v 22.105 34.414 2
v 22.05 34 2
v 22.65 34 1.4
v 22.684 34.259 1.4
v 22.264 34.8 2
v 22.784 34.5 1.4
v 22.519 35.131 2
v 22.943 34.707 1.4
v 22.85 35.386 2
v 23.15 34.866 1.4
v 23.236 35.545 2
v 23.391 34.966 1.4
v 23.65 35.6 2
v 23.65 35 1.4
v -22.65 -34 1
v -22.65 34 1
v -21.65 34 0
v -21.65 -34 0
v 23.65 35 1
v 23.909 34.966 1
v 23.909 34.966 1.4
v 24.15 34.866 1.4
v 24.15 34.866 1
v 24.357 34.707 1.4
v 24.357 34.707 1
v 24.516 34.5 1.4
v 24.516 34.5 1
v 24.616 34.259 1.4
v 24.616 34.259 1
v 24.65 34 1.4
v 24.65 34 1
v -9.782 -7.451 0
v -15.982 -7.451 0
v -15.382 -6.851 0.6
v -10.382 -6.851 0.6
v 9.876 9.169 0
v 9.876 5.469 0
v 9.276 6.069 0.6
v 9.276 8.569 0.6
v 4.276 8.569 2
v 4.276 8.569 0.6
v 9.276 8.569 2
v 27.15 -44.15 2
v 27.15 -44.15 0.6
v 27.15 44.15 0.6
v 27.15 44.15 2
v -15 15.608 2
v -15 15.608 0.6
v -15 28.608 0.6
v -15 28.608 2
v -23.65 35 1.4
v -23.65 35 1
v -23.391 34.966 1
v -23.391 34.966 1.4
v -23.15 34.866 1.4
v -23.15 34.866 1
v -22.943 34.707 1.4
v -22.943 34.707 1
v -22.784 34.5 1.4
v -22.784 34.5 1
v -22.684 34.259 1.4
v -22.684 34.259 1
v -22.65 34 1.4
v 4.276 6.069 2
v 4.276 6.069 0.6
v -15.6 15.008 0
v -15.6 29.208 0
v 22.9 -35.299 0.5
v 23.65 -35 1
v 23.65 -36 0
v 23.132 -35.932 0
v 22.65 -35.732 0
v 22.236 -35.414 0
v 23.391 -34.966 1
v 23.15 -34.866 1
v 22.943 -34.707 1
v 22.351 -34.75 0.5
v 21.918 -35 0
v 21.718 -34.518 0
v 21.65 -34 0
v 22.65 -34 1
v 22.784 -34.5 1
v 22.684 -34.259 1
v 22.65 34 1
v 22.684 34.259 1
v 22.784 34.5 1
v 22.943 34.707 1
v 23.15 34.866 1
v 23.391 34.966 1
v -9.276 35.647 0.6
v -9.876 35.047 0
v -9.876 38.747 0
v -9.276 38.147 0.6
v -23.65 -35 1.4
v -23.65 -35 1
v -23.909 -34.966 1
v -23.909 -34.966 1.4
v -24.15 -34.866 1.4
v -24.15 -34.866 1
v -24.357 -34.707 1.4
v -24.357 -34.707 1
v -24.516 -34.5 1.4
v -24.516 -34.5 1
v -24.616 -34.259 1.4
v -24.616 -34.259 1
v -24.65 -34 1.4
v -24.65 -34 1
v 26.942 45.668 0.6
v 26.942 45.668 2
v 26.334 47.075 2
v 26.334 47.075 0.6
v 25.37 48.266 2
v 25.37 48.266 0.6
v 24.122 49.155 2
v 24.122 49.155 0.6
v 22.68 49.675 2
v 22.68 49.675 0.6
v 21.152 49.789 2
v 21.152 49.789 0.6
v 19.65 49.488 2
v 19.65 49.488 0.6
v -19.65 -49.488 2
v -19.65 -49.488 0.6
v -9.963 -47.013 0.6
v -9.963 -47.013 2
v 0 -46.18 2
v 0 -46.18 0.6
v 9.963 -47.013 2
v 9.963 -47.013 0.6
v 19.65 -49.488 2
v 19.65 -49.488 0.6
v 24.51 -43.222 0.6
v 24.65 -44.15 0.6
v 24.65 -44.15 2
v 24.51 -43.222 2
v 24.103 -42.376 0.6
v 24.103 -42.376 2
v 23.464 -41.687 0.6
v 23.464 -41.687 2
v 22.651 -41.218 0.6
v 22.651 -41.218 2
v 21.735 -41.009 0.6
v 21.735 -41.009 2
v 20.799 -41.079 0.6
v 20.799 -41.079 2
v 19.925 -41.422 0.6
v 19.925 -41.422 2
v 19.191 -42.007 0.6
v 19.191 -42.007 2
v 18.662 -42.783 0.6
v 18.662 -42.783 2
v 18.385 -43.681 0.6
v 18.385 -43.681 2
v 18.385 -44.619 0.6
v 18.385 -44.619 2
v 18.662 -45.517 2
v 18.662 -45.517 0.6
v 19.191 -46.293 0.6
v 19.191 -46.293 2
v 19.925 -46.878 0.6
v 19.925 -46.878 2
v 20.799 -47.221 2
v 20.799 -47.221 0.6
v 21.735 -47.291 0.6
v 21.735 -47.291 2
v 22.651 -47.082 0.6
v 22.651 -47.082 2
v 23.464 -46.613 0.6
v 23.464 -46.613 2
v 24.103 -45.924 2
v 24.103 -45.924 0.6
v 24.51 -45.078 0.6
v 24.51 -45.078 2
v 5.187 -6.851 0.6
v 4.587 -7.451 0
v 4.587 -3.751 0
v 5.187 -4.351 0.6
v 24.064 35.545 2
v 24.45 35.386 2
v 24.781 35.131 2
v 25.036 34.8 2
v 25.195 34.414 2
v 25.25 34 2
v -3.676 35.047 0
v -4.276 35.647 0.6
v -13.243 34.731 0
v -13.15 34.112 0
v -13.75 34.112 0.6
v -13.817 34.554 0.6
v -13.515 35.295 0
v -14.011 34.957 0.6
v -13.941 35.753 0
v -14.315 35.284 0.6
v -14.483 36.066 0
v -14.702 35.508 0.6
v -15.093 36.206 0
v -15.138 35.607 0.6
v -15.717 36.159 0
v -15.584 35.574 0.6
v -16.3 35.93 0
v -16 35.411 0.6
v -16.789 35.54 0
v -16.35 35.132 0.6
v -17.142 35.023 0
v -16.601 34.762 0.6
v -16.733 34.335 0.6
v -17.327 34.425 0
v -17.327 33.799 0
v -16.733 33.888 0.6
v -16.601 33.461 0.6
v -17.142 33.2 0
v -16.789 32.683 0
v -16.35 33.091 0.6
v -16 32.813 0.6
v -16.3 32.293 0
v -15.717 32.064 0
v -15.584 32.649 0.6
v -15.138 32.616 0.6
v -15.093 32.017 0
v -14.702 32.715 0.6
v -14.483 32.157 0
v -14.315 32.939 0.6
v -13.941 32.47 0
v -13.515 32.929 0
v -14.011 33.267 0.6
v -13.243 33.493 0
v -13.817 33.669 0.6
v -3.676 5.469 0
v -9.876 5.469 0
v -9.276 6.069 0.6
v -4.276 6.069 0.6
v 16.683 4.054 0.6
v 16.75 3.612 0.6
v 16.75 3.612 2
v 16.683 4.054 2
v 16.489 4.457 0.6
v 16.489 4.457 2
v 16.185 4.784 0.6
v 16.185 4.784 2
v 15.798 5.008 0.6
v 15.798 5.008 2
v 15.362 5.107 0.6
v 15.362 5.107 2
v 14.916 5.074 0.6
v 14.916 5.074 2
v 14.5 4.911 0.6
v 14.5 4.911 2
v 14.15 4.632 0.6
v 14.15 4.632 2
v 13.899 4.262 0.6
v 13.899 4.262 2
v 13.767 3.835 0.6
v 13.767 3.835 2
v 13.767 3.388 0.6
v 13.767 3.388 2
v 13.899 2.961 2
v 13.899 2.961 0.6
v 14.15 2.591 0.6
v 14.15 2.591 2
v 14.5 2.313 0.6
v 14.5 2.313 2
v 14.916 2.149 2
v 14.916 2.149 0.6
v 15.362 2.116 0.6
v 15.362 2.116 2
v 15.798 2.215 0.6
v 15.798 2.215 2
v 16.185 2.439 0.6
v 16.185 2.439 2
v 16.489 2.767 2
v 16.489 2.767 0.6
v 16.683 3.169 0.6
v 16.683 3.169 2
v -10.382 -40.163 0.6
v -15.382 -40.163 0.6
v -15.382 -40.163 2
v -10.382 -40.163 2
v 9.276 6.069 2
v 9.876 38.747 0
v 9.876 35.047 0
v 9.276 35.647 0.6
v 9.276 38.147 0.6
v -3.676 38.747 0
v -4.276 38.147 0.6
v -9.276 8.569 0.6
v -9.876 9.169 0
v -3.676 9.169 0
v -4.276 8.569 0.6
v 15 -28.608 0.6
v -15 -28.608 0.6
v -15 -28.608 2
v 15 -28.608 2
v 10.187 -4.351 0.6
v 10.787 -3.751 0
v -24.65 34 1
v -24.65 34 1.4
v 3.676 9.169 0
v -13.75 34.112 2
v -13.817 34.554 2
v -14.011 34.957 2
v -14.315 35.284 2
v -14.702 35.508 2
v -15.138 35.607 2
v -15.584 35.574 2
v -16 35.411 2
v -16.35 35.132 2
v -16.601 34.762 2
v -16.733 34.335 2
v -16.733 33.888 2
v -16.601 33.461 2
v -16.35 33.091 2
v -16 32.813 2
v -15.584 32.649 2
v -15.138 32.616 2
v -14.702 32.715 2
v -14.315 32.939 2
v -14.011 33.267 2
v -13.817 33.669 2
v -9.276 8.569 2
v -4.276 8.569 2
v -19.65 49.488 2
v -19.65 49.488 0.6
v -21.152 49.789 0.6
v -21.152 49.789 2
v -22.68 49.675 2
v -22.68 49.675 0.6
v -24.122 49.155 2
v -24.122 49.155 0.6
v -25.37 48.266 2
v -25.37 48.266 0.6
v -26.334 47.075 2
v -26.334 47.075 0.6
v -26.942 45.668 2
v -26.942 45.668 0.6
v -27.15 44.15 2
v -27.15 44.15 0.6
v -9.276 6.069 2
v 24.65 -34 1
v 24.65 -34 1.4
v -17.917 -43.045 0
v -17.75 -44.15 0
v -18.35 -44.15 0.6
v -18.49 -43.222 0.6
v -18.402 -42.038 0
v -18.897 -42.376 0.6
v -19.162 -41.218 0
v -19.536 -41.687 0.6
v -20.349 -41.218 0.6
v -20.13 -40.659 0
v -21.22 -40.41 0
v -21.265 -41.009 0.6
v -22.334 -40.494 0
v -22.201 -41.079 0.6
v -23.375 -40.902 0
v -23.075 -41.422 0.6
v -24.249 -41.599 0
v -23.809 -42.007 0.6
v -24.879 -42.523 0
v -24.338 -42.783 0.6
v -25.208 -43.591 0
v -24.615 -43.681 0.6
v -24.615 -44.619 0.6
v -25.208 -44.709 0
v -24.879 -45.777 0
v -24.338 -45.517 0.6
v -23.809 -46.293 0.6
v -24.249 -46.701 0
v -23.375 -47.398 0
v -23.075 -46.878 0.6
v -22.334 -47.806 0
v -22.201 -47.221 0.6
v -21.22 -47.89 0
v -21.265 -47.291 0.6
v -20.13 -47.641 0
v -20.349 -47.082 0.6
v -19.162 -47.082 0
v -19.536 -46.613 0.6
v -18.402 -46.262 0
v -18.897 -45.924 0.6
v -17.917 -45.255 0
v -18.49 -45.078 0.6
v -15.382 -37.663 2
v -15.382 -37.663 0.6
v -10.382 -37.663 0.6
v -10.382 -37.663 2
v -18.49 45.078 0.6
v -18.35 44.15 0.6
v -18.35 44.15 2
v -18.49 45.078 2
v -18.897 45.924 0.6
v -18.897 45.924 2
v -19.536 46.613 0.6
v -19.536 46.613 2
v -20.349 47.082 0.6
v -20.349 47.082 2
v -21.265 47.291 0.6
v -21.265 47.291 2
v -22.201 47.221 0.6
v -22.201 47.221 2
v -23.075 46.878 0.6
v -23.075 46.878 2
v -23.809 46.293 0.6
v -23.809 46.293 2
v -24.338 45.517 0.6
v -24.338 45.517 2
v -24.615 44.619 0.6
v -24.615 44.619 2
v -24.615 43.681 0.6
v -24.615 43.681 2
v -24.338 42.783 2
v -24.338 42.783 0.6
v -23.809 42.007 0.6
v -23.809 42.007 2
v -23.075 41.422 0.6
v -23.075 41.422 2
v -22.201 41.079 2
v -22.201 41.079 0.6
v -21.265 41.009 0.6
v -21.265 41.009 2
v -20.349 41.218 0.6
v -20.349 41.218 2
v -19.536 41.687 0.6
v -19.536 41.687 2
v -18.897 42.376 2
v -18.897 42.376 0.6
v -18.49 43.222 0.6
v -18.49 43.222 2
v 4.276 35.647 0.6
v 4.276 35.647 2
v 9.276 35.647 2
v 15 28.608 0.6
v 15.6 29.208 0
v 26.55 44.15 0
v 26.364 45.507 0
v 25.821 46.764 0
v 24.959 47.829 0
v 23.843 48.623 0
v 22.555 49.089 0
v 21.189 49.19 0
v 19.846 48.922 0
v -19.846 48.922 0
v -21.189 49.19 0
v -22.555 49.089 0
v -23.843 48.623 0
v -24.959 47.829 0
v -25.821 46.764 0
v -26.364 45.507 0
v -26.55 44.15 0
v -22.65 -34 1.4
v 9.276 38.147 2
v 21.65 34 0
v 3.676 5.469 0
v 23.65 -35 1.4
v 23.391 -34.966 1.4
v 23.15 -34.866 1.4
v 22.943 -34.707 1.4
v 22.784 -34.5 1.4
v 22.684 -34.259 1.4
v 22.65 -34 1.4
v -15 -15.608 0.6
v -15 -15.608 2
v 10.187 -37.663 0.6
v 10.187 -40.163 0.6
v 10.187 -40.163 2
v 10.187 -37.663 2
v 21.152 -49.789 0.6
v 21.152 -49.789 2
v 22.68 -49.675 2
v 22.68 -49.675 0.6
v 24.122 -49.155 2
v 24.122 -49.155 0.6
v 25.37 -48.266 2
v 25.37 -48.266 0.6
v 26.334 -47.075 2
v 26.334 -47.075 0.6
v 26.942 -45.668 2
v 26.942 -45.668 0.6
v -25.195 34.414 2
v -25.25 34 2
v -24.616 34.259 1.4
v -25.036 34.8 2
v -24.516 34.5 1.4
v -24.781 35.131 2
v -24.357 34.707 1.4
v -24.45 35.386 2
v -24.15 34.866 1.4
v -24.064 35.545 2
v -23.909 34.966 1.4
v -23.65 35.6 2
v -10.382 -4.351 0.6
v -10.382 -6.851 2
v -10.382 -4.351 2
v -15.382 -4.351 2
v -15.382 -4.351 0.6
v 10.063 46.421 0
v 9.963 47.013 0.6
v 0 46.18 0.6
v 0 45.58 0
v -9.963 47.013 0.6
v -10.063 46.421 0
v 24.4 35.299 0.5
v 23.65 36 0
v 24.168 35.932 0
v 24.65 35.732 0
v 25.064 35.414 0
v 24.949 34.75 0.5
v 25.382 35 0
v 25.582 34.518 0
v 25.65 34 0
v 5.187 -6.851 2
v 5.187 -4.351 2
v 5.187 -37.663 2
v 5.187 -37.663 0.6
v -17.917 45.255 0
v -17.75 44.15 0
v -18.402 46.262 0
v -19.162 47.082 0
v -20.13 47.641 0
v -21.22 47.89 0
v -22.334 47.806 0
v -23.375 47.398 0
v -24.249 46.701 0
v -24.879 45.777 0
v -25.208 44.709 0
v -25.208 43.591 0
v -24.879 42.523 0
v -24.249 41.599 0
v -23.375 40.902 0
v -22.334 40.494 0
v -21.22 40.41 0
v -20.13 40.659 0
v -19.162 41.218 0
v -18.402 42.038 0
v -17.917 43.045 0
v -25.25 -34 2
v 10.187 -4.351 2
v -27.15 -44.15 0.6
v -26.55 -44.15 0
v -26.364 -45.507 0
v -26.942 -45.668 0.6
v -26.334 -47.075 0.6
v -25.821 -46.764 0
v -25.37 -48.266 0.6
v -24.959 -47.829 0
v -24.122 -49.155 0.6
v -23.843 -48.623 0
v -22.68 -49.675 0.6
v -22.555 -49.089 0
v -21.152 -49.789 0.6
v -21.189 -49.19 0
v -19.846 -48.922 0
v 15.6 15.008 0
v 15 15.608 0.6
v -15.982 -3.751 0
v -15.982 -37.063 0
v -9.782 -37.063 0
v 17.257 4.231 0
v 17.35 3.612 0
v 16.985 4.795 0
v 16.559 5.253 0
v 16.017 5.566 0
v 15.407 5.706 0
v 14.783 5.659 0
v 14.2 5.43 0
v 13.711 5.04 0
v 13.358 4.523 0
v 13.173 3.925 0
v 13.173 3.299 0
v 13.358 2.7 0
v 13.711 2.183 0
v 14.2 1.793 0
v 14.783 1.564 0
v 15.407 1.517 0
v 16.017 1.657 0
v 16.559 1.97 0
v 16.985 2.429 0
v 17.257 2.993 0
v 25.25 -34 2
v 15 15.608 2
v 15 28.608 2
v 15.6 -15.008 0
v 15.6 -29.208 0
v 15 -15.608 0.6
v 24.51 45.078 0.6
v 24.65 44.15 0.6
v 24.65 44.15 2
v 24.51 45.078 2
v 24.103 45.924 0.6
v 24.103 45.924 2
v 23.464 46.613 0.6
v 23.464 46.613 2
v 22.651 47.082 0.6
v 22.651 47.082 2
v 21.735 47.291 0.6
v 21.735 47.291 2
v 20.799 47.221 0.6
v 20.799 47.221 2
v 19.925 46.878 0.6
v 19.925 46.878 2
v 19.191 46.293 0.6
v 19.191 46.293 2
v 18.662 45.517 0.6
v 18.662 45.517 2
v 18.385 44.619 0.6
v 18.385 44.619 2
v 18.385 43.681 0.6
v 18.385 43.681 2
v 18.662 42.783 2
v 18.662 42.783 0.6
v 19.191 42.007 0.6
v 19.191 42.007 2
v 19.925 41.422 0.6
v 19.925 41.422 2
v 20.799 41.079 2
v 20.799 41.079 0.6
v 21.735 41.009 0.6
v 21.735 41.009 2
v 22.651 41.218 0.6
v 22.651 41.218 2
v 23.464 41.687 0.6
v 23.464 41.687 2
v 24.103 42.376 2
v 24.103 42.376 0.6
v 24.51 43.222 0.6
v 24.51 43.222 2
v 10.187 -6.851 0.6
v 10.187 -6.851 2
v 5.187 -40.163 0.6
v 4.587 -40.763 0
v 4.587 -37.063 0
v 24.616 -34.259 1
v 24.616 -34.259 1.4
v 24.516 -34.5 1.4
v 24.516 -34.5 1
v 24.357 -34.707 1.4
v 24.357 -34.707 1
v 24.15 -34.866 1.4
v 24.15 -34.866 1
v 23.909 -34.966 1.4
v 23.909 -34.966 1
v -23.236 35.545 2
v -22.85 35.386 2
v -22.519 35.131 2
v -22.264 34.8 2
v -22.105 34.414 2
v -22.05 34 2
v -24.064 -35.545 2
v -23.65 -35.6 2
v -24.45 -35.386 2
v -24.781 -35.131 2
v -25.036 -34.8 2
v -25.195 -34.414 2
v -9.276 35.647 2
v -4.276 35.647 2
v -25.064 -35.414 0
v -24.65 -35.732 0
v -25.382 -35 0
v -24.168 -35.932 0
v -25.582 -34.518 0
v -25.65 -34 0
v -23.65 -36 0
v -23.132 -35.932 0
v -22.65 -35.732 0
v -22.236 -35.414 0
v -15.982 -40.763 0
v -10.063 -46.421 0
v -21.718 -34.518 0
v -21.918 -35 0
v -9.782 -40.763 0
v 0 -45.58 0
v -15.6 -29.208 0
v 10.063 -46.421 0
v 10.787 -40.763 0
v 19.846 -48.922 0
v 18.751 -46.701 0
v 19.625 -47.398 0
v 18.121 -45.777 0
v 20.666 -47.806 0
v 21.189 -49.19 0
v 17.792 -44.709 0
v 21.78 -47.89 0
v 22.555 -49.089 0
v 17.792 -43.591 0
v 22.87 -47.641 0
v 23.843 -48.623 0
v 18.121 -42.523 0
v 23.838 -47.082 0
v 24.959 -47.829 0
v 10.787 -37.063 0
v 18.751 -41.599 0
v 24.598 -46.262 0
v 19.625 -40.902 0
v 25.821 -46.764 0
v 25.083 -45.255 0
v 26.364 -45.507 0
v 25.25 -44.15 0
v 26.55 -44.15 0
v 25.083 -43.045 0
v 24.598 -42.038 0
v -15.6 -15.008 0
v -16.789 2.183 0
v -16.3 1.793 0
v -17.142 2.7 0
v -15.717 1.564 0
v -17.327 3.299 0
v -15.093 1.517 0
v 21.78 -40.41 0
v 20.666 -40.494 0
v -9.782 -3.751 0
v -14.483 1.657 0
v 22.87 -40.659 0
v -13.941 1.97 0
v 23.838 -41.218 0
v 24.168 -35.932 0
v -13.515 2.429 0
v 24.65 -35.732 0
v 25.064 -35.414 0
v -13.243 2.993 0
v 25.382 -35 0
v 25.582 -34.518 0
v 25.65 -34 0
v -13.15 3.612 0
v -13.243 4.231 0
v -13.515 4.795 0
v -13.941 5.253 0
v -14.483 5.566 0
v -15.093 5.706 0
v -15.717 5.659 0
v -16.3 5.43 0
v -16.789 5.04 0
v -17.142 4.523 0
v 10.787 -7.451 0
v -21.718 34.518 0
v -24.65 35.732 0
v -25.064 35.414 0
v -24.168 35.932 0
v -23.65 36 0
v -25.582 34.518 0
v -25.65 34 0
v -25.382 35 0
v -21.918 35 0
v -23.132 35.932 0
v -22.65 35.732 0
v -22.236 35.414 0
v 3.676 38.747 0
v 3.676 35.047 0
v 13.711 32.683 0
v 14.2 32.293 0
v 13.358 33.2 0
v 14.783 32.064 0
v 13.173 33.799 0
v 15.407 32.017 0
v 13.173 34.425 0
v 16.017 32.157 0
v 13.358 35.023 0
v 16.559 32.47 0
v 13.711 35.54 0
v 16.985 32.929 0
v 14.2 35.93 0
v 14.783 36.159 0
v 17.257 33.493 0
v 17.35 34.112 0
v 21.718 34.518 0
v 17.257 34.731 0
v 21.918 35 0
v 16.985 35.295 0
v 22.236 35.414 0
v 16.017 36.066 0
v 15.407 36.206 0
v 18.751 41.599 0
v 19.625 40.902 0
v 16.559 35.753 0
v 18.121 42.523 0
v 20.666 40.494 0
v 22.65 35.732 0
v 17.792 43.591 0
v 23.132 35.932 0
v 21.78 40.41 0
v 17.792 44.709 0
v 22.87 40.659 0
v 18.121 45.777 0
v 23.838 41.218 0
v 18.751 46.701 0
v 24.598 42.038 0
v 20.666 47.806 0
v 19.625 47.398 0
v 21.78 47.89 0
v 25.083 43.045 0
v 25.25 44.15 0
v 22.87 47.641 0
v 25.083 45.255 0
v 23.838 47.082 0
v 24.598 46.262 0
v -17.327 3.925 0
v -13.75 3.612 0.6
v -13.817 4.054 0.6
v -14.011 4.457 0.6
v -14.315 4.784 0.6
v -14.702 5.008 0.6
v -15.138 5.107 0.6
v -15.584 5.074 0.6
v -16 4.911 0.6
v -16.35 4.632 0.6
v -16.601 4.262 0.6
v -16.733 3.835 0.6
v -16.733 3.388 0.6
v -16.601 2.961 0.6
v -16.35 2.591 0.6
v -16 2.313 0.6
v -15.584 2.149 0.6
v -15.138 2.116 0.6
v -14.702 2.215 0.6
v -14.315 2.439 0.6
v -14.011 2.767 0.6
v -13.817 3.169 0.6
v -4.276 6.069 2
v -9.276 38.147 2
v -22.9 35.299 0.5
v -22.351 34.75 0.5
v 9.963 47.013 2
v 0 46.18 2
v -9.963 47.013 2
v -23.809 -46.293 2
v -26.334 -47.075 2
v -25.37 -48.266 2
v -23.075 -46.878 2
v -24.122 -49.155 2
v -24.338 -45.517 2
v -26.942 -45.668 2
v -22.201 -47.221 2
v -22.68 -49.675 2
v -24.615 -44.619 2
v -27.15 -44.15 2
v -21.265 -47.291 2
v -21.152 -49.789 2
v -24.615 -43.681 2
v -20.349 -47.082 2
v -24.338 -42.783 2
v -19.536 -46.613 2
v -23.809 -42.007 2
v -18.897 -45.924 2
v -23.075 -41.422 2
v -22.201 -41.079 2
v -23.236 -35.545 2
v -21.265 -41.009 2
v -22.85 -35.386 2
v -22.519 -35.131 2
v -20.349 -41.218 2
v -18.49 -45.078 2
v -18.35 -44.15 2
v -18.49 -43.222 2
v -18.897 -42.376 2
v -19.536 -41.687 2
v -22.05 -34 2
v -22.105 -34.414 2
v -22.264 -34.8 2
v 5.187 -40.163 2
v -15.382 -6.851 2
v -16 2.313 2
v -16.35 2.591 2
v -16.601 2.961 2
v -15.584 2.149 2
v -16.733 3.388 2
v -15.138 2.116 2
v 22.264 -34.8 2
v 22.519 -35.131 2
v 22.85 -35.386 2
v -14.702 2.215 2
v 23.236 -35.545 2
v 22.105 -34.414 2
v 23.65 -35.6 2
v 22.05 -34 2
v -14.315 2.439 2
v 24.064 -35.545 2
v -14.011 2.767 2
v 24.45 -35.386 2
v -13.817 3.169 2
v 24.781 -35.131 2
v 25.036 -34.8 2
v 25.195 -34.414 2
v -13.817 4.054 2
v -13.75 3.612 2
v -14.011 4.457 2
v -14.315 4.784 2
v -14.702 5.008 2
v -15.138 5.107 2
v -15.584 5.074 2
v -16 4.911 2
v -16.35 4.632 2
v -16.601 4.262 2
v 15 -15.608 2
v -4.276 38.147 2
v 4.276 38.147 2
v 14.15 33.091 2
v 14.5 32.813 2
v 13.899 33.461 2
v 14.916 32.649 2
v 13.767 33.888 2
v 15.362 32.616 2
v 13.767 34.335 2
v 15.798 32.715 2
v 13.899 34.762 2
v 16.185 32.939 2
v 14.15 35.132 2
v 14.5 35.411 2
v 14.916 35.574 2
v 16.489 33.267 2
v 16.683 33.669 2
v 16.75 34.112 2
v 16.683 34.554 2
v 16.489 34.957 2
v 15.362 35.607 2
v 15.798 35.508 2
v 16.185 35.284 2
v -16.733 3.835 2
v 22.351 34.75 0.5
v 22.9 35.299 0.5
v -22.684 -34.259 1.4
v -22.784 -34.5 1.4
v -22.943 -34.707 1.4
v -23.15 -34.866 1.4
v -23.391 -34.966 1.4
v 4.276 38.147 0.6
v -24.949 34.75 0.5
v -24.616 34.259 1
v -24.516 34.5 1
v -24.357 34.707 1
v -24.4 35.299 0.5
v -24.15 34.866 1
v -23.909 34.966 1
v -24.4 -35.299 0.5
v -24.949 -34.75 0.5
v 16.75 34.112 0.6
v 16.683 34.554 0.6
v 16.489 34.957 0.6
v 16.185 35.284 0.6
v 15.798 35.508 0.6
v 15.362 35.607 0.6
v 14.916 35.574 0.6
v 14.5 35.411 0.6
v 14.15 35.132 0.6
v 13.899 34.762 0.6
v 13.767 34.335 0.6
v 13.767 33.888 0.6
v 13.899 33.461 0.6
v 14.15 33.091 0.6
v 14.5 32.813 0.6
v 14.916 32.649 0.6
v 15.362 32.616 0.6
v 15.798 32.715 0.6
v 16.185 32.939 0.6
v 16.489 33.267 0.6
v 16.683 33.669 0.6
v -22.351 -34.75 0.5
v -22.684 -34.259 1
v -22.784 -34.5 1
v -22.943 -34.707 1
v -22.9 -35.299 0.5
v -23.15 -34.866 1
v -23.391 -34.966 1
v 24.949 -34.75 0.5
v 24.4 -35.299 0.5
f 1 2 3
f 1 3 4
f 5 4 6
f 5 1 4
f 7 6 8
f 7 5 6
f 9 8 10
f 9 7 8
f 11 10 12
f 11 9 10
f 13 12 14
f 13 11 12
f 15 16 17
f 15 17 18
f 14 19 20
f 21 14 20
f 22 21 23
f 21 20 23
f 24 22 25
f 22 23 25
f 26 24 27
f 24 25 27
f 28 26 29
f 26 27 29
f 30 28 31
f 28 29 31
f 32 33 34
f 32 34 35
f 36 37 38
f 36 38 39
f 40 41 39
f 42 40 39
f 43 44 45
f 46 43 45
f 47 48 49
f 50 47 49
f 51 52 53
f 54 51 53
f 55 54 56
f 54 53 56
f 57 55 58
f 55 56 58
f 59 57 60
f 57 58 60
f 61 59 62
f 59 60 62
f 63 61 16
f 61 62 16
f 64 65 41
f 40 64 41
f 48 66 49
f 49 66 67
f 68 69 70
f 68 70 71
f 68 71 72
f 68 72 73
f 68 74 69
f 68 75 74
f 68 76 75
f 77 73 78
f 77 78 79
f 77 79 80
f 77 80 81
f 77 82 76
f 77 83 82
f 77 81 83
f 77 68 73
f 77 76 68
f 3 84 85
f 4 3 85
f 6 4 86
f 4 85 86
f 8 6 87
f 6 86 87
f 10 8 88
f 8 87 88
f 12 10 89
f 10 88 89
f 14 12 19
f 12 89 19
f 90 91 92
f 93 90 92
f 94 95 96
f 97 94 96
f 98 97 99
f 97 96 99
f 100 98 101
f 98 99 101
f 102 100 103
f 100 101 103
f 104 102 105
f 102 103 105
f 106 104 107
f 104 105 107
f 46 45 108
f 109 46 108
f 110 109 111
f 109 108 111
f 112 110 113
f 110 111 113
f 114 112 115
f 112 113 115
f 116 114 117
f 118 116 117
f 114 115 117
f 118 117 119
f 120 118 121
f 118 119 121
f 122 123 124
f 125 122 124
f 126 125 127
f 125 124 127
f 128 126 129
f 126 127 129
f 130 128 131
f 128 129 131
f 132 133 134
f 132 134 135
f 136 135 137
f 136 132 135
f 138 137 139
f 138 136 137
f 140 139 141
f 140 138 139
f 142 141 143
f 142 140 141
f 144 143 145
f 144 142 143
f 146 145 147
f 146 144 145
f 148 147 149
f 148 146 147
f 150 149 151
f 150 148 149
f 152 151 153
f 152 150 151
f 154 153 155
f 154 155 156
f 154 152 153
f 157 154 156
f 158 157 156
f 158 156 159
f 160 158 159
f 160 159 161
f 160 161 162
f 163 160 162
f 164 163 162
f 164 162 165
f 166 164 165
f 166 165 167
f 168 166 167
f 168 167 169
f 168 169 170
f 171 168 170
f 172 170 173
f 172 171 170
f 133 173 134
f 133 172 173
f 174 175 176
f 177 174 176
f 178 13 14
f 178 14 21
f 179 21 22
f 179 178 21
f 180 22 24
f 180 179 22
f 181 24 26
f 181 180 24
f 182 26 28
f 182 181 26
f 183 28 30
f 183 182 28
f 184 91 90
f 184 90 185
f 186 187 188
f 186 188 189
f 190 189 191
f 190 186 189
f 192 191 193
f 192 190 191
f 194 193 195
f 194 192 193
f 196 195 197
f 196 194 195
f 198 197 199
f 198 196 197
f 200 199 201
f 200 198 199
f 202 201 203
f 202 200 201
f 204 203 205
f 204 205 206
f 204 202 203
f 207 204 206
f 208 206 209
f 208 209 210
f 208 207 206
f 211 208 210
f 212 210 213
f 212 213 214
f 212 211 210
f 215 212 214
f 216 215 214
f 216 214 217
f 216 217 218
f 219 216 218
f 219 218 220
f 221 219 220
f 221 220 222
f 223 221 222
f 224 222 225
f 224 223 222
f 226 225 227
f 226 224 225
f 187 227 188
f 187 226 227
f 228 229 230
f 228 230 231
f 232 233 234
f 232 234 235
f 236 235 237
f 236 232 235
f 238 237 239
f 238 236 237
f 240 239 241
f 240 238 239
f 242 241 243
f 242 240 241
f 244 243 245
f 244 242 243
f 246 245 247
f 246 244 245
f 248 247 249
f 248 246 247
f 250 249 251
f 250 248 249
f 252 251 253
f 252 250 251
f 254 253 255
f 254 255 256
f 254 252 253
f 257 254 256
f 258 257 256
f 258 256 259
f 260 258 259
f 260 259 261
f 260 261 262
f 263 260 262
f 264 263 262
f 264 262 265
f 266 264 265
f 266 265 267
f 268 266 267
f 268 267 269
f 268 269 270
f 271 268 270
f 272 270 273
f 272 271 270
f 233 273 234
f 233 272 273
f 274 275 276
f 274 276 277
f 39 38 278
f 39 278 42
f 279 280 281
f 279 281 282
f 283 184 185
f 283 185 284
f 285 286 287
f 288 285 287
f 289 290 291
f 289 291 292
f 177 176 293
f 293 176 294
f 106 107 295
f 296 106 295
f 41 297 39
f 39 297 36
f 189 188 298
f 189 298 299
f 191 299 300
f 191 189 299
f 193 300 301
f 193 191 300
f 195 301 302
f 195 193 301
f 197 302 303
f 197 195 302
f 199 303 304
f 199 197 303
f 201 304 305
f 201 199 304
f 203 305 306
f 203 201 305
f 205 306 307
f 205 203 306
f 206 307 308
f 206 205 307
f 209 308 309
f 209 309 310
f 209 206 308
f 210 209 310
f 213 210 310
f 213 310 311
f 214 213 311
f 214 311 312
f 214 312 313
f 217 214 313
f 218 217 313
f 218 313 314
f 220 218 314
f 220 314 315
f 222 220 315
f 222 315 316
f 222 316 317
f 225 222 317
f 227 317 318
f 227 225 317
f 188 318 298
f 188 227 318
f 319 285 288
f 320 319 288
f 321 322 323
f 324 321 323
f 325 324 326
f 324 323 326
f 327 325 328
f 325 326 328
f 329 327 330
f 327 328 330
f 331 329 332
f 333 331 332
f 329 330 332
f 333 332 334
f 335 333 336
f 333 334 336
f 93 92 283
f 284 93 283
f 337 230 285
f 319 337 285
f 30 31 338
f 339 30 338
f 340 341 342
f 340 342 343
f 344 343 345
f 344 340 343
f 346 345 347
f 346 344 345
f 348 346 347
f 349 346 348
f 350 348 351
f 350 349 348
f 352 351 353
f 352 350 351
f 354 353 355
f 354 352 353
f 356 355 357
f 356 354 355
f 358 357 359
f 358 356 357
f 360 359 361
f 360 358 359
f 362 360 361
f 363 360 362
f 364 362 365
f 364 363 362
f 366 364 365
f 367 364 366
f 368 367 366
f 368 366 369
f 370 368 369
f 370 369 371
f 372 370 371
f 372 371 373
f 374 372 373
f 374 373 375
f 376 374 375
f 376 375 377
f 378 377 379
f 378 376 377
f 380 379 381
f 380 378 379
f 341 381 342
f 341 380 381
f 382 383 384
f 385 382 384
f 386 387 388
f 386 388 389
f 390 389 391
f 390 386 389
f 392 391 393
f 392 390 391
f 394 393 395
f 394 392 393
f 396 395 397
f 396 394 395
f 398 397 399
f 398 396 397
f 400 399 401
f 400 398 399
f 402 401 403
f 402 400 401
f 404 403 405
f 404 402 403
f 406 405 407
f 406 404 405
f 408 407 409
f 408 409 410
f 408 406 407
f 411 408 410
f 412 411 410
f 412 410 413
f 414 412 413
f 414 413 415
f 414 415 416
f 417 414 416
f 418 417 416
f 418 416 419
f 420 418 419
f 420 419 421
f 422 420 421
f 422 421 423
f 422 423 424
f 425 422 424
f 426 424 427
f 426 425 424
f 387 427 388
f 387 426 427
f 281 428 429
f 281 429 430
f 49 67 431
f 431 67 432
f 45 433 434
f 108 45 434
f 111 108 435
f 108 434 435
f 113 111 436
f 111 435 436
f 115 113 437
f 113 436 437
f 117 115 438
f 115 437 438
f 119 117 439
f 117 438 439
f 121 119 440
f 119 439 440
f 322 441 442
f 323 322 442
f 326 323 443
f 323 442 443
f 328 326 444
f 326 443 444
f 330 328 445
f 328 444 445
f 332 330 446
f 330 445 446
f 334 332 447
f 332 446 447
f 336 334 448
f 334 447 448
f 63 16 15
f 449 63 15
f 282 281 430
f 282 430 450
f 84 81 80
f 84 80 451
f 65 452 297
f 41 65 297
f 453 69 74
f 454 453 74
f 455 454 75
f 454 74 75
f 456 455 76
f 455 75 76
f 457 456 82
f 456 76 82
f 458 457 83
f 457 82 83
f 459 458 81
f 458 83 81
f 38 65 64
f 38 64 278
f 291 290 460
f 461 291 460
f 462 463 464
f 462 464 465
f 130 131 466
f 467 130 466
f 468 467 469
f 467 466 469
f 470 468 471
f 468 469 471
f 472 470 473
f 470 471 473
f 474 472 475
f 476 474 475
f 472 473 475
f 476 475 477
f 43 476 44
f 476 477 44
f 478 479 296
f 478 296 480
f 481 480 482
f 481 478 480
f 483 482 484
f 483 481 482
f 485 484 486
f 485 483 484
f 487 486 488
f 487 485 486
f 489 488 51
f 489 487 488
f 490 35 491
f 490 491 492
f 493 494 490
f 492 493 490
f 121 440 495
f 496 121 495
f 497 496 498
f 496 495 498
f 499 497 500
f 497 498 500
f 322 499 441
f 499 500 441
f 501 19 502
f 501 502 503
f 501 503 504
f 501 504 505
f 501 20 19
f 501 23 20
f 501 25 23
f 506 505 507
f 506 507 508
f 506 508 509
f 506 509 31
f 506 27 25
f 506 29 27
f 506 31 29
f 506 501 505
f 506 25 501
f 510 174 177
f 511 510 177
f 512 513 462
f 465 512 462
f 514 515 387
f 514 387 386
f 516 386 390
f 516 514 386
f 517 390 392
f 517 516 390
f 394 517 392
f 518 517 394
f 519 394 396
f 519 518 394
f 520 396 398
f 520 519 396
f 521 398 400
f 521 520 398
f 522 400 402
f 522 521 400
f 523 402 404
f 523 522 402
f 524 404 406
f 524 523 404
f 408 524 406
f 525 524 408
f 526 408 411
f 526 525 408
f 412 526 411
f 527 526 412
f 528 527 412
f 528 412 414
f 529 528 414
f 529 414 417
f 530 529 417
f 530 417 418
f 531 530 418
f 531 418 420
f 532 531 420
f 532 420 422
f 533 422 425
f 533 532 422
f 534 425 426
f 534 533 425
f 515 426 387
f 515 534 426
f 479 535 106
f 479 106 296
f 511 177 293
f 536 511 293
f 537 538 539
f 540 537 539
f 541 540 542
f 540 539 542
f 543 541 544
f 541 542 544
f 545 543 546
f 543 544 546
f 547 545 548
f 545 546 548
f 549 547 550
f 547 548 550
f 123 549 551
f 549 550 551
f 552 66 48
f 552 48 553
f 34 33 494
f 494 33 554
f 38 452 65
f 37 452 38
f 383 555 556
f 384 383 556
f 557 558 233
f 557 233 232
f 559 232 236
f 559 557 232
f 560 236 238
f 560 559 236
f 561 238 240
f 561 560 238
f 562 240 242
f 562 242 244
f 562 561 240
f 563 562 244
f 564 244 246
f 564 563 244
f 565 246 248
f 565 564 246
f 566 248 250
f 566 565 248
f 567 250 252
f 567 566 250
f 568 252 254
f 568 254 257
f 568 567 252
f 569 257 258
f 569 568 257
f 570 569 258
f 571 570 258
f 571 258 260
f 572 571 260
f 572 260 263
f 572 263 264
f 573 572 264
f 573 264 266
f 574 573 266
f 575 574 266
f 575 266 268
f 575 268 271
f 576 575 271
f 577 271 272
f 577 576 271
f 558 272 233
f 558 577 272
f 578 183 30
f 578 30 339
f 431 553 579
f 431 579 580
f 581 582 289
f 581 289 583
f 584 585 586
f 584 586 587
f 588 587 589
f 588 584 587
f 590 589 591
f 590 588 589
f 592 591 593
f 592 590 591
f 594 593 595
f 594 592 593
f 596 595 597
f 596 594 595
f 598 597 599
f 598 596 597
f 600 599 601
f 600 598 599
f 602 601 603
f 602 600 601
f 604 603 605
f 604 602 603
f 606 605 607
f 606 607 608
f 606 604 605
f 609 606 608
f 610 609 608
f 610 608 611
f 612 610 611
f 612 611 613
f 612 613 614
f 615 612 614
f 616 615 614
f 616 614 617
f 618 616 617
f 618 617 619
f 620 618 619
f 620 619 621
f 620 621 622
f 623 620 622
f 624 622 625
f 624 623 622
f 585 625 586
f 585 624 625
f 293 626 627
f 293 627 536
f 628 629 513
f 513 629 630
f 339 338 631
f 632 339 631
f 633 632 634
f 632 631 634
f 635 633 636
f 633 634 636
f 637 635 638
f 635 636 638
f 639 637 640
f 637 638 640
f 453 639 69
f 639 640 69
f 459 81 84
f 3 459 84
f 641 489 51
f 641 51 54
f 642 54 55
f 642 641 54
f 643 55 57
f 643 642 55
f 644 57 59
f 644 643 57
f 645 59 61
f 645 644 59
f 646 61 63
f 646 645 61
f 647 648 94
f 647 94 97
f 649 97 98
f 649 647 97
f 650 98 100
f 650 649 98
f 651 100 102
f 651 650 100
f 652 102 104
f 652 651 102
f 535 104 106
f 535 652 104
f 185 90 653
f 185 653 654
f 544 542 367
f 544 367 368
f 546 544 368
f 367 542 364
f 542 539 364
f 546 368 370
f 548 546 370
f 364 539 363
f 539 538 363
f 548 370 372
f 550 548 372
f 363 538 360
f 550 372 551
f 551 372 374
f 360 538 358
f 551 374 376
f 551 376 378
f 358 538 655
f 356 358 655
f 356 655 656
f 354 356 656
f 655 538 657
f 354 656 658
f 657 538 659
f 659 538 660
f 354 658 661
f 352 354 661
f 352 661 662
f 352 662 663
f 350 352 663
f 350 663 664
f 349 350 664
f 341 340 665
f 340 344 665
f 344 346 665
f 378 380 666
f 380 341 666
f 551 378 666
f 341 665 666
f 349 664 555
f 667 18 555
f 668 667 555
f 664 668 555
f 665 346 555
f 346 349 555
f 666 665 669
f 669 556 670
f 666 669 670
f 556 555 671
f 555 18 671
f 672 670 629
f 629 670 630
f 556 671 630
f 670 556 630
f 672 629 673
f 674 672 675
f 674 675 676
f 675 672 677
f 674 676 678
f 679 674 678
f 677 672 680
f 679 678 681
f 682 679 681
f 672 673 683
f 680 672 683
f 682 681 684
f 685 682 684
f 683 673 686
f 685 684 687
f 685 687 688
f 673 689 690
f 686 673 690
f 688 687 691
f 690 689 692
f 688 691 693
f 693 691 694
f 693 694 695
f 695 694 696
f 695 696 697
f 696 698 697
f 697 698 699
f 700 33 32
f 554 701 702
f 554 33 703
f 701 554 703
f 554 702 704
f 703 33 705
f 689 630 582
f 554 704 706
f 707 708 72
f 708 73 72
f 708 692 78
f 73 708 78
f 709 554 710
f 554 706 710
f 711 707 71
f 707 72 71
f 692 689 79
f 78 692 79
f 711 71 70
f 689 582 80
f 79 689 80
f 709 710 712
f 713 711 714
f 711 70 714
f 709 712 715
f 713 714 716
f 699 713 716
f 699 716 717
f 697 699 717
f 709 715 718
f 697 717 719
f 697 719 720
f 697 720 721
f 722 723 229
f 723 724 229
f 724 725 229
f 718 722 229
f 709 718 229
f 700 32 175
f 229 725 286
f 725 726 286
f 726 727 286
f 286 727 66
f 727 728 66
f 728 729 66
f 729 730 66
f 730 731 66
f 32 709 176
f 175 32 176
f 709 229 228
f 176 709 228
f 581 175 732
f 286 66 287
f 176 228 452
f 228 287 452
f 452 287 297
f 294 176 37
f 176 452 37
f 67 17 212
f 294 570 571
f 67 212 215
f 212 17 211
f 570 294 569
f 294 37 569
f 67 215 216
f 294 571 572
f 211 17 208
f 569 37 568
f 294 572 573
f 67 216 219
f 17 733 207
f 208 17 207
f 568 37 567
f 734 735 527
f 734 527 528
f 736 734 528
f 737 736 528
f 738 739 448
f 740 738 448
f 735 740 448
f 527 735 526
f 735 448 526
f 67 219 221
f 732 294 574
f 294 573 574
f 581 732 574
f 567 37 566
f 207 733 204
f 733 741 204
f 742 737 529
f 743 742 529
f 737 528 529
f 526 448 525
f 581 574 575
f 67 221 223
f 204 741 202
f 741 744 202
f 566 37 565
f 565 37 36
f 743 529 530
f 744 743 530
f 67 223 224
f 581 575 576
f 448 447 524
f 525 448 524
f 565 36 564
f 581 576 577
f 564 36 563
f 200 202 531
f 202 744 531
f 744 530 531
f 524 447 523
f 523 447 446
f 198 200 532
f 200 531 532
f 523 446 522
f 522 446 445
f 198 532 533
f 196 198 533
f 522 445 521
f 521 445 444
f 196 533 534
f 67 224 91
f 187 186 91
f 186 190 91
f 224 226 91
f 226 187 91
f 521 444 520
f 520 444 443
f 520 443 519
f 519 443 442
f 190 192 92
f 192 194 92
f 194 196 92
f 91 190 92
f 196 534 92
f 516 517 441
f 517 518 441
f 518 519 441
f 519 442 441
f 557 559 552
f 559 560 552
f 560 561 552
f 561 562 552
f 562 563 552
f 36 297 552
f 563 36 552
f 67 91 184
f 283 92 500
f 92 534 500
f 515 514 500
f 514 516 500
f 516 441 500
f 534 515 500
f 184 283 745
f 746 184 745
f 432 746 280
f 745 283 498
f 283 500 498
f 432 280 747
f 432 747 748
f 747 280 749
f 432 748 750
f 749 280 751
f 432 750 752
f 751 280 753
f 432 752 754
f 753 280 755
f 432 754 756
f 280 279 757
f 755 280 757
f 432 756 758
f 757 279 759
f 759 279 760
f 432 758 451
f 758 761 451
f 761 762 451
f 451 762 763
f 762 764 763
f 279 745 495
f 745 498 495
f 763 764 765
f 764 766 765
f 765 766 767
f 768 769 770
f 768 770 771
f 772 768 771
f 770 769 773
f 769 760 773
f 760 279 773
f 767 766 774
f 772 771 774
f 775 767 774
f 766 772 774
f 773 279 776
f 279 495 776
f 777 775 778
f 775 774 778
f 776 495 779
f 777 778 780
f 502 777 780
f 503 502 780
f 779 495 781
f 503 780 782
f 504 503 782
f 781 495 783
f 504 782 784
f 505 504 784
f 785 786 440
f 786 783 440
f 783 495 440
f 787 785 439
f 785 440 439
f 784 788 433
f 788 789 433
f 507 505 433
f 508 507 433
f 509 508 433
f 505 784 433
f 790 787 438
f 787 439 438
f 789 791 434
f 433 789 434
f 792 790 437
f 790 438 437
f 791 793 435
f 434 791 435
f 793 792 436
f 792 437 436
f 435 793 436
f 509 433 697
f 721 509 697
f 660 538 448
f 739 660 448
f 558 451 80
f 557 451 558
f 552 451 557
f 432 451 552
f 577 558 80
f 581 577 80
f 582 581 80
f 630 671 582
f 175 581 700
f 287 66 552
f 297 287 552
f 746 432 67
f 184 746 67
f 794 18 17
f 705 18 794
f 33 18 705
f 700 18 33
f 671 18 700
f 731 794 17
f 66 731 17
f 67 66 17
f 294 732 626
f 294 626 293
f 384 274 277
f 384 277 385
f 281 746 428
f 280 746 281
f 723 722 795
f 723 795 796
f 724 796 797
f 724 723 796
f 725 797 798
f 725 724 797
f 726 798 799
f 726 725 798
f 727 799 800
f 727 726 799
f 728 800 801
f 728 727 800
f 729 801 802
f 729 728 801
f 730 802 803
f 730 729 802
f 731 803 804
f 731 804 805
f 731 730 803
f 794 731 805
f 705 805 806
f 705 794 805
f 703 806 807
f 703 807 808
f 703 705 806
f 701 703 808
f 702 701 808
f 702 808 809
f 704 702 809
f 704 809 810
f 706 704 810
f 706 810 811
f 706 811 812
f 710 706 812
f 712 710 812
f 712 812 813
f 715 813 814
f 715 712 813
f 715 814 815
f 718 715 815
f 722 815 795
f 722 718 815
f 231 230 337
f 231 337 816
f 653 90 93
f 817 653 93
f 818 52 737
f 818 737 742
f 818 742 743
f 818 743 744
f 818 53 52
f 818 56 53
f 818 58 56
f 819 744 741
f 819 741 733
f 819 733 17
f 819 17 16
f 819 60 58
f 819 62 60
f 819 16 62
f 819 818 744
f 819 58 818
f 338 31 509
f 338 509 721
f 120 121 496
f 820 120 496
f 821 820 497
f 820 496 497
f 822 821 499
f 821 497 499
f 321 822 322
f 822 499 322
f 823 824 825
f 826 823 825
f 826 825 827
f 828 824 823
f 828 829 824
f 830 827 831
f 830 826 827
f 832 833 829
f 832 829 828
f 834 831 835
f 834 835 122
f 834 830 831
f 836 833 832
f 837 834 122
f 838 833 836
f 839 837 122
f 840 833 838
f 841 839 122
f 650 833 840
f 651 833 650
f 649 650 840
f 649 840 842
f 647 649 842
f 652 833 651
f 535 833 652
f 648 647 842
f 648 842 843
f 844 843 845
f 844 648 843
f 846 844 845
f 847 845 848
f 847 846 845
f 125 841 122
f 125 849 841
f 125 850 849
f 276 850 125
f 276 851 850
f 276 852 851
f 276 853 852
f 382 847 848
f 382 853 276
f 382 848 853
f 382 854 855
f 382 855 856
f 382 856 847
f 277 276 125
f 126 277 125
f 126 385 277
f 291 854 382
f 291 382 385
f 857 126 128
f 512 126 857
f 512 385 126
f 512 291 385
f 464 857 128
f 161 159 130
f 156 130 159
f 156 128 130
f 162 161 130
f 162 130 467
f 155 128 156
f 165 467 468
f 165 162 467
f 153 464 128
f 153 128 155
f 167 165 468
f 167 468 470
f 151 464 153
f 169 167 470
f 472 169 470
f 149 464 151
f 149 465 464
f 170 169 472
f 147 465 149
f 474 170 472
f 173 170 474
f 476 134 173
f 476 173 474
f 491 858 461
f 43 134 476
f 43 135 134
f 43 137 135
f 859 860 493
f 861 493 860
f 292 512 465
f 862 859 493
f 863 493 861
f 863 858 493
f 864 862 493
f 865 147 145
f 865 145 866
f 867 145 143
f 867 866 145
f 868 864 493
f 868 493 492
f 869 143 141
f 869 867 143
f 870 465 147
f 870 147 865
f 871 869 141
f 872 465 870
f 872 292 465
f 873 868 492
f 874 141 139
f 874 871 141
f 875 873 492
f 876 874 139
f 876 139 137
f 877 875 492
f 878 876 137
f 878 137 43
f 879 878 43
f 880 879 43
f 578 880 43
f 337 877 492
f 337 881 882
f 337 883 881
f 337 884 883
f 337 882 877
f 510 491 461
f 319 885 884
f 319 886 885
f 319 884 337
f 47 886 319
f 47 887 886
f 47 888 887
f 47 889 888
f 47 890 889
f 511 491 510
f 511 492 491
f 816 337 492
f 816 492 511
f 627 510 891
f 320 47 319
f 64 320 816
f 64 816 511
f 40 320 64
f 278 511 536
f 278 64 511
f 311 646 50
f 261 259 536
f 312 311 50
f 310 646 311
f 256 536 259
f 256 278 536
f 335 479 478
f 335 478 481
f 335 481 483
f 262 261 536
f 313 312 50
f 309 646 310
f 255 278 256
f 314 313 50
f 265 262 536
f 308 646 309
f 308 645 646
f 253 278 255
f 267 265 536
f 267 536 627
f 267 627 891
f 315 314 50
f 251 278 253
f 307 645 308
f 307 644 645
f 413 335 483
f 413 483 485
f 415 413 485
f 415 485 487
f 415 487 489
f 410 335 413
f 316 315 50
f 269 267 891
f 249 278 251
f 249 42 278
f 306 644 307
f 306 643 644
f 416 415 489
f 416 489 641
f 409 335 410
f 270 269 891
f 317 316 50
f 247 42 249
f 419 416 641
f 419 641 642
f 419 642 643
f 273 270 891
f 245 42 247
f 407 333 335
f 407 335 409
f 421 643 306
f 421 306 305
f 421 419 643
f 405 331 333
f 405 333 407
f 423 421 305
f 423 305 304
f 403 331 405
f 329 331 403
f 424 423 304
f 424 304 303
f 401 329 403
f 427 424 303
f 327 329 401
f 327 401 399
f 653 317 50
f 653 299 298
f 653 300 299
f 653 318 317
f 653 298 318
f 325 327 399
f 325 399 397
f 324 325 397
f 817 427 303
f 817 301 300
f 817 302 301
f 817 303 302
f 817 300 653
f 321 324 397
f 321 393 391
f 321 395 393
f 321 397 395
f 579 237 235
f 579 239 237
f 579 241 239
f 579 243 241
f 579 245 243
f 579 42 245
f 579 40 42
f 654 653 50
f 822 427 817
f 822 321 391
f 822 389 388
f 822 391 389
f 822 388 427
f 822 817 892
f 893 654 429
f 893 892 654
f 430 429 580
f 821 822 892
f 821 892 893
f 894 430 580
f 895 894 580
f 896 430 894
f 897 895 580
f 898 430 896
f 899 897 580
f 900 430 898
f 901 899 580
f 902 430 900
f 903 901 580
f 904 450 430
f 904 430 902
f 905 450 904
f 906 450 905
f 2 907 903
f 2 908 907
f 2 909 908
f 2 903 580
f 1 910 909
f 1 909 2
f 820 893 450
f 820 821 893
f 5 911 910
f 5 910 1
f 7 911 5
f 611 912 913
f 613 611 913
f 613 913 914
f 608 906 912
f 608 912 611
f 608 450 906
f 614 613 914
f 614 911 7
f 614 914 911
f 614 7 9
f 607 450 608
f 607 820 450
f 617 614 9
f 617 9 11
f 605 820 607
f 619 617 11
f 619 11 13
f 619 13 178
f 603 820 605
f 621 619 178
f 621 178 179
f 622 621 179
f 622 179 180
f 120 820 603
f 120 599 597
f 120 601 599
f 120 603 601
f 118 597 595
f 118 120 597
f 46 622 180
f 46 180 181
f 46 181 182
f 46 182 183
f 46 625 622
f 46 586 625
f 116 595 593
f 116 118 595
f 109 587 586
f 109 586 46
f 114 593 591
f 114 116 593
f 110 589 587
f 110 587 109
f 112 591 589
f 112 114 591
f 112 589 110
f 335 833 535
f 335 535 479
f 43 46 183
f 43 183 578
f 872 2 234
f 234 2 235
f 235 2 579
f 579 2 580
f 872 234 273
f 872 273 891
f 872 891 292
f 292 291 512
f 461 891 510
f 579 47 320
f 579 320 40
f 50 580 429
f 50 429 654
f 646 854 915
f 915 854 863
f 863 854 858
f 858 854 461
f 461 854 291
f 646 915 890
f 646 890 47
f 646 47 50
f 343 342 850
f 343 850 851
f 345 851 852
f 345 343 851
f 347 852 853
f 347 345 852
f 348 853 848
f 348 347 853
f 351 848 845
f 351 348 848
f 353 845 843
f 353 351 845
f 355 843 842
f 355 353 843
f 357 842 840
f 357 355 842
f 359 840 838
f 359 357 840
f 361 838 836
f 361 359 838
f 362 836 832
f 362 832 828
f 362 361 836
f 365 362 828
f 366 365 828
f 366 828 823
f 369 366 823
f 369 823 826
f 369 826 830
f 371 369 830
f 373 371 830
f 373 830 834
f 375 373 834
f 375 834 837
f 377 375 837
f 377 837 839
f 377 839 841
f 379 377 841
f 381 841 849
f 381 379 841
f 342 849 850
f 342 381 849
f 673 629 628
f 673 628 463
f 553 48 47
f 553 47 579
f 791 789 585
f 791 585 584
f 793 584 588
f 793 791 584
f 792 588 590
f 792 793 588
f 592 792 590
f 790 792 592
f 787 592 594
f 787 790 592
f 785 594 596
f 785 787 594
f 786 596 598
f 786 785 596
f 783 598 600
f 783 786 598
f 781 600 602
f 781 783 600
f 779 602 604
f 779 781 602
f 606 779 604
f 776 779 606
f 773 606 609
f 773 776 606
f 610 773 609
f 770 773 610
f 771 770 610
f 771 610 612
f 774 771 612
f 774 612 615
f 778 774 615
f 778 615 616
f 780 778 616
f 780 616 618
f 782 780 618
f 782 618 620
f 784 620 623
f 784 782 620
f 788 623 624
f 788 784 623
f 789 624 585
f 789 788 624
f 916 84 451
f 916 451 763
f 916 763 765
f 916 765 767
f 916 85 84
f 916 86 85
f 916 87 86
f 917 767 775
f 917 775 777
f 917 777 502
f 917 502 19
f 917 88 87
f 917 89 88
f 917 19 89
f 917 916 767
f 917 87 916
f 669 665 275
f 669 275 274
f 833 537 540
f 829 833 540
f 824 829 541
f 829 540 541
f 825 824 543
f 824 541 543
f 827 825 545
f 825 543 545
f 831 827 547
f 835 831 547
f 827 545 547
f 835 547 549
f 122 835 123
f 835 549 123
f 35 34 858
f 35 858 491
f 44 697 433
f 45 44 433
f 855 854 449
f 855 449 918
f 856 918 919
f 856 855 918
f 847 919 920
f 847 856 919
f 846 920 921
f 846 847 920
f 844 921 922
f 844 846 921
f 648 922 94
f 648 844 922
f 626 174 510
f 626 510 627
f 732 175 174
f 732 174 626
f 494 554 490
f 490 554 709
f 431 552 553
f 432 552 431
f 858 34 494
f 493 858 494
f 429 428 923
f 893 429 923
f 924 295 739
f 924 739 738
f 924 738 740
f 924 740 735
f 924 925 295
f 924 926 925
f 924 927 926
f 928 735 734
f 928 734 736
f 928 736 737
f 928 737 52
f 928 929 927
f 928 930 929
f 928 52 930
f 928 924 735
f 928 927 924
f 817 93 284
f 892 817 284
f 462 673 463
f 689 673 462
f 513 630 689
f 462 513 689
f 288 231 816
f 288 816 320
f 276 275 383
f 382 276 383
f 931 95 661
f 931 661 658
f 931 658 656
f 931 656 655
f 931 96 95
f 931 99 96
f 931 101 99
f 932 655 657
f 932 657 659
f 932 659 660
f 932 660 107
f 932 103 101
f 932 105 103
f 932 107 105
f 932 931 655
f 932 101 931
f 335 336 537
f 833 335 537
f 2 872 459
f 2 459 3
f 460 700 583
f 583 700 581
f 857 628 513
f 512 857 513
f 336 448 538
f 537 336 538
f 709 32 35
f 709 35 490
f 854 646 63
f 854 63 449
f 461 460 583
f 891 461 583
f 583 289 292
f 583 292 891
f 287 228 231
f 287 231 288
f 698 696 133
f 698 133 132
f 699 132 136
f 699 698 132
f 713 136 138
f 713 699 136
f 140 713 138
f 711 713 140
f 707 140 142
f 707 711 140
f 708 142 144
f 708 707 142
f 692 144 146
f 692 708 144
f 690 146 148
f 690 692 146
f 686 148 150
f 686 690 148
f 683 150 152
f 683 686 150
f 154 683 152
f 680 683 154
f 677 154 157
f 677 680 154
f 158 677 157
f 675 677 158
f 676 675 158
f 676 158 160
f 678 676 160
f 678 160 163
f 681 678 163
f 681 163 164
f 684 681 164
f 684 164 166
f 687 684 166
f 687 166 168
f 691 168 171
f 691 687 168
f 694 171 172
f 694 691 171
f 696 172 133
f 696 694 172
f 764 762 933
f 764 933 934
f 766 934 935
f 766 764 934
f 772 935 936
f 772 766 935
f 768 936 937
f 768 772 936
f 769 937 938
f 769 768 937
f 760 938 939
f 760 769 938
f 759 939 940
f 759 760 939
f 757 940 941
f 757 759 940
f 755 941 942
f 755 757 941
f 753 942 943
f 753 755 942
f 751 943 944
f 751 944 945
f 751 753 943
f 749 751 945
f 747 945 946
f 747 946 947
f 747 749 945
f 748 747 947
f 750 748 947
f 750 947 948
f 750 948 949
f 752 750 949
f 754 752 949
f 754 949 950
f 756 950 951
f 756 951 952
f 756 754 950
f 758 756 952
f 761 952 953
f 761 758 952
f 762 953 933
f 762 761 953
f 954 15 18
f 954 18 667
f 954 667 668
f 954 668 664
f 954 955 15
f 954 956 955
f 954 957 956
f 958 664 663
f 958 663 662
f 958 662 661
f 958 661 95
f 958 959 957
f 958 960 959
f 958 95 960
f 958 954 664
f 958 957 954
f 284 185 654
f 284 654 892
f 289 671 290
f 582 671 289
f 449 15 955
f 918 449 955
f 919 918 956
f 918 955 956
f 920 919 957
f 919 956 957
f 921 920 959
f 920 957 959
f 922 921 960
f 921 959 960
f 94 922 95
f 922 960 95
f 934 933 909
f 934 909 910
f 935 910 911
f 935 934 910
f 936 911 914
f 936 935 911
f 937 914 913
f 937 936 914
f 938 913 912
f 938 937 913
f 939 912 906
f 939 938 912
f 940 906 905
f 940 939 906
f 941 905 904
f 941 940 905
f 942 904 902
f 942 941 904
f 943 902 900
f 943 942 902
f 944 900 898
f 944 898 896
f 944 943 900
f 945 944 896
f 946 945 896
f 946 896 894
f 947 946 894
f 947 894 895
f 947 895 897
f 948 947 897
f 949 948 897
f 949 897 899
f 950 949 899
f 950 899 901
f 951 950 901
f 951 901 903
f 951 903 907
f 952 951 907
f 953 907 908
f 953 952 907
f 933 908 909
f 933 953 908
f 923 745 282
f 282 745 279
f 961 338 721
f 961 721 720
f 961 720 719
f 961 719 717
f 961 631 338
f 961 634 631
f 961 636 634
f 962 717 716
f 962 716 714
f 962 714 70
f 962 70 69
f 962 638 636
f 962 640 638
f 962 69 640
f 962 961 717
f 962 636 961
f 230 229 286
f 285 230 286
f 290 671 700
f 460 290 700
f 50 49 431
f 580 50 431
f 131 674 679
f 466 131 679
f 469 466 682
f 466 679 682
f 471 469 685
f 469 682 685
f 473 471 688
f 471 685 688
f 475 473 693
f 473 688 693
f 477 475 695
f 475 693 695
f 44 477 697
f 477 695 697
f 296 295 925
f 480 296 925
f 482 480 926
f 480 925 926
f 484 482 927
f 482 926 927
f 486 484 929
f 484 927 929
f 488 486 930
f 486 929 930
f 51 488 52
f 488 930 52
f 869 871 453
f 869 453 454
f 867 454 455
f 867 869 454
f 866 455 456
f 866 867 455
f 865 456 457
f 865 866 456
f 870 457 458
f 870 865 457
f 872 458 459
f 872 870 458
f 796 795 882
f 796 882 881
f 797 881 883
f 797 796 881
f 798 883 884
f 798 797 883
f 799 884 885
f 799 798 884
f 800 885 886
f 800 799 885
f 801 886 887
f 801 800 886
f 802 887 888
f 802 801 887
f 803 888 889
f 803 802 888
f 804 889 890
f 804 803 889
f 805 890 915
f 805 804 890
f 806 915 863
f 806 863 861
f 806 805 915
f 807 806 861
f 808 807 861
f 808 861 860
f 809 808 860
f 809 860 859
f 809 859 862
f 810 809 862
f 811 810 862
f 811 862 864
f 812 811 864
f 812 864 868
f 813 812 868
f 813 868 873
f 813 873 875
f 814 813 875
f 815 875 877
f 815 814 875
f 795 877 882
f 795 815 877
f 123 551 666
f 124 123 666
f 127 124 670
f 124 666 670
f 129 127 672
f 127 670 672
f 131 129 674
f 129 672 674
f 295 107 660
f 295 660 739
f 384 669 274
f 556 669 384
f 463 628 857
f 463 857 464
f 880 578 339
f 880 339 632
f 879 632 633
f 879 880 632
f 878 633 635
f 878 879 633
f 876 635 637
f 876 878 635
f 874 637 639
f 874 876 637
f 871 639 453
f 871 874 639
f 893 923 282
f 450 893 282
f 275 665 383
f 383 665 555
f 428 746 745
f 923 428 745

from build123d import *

# Parameters (mm, degrees)
F0_R     = 3.15
F0_W     = 5
F0_H     = 2.5
F0_W_2   = 30
F0_H_2   = 13
F0_R_2   = 1.5
F1_DEPTH = 2
F2_SIZE  = 0.6
F3_SIZE  = 1


with BuildPart() as f1:
    # F0 (on Top) → F1 (new body)
    with BuildSketch(Plane.XY):
        with BuildLine():
            ThreePointArc((19.649657, 49.48842), (0, 46.17961), (-19.649657, 49.48842))
            ThreePointArc((-19.649657, 49.48842), (-24.776283, 48.753093), (-27.15, 44.15))
            Line((-27.15, 44.15), (-27.15, -44.15))
            ThreePointArc((-27.15, -44.15), (-24.776283, -48.753093), (-19.649657, -49.48842))
            ThreePointArc((-19.649657, -49.48842), (0, -46.17961), (19.649657, -49.48842))
            ThreePointArc((19.649657, -49.48842), (24.776283, -48.753093), (27.15, -44.15))
            Line((27.15, -44.15), (27.15, 44.15))
            ThreePointArc((27.15, 44.15), (24.776283, 48.753093), (19.649657, 49.48842))
        make_face()
        with Locations((-21.5, -44.15)):
            Circle(F0_R, mode=Mode.SUBTRACT)
        with Locations((-12.882352, -38.913459)):
            Rectangle(F0_W, F0_H, mode=Mode.SUBTRACT)
        with Locations((-12.882352, -5.600822)):
            Rectangle(F0_W, F0_H, mode=Mode.SUBTRACT)
        with Locations((7.687139, -38.913459)):
            Rectangle(F0_W, F0_H, mode=Mode.SUBTRACT)
        with Locations((21.5, -44.15)):
            Circle(F0_R, mode=Mode.SUBTRACT)
        with Locations((0, -22.107908)):
            Rectangle(F0_W_2, F0_H_2, mode=Mode.SUBTRACT)
        with Locations((7.687139, -5.600822)):
            Rectangle(F0_W, F0_H, mode=Mode.SUBTRACT)
        with BuildLine():
            ThreePointArc((-22.65, -34), (-22.942893, -34.707107), (-23.65, -35))
            ThreePointArc((-23.65, -35), (-24.357107, -34.707107), (-24.65, -34))
            Line((-24.65, -34), (-24.65, 34))
            ThreePointArc((-24.65, 34), (-24.357107, 34.707107), (-23.65, 35))
            ThreePointArc((-23.65, 35), (-22.942893, 34.707107), (-22.65, 34))
            Line((-22.65, 34), (-22.65, -34))
        make_face(mode=Mode.SUBTRACT)
        with Locations((-15.25, 3.611581)):
            Circle(F0_R_2, mode=Mode.SUBTRACT)
        with Locations((-6.775575, 7.31866)):
            Rectangle(F0_W, F0_H, mode=Mode.SUBTRACT)
        with Locations((-15.25, 34.111581)):
            Circle(F0_R_2, mode=Mode.SUBTRACT)
        with Locations((-21.5, 44.15)):
            Circle(F0_R, mode=Mode.SUBTRACT)
        with Locations((-6.775575, 36.897157)):
            Rectangle(F0_W, F0_H, mode=Mode.SUBTRACT)
        with Locations((6.775575, 7.31866)):
            Rectangle(F0_W, F0_H, mode=Mode.SUBTRACT)
        with Locations((0, 22.107908)):
            Rectangle(F0_W_2, F0_H_2, mode=Mode.SUBTRACT)
        with Locations((15.25, 3.611581)):
            Circle(F0_R_2, mode=Mode.SUBTRACT)
        with BuildLine():
            Line((22.65, -34), (22.65, 34))
            ThreePointArc((22.65, 34), (22.942893, 34.707107), (23.65, 35))
            ThreePointArc((23.65, 35), (24.357107, 34.707107), (24.65, 34))
            Line((24.65, 34), (24.65, -34))
            ThreePointArc((24.65, -34), (24.357107, -34.707107), (23.65, -35))
            ThreePointArc((23.65, -35), (22.942893, -34.707107), (22.65, -34))
        make_face(mode=Mode.SUBTRACT)
        with Locations((6.775575, 36.897157)):
            Rectangle(F0_W, F0_H, mode=Mode.SUBTRACT)
        with Locations((15.25, 34.111581)):
            Circle(F0_R_2, mode=Mode.SUBTRACT)
        with Locations((21.5, 44.15)):
            Circle(F0_R, mode=Mode.SUBTRACT)
    extrude(amount=F1_DEPTH)

    # F2
    f2_edges = [f1.edges().sort_by_distance(p)[0] for p in [
        (27.15, 0, 0),
        (18.35, -44.15, 0),
        (-24.65, -44.15, 0),
        (-15.382352, -38.913459, 0),
        (-12.882352, -37.663459, 0),
        (-10.382352, -38.913459, 0),
        (-12.882352, -40.163459, 0),
        (5.187139, -38.913459, 0),
        (7.687139, -37.663459, 0),
        (10.187139, -38.913459, 0),
        (7.687139, -40.163459, 0),
        (0, -28.607908, 0),
        (15, -22.107908, 0),
        (0, -15.607908, 0),
        (-15, -22.107908, 0),
        (-15.382352, -5.600822, 0),
        (-12.882352, -6.850822, 0),
        (-10.382352, -5.600822, 0),
        (-12.882352, -4.350822, 0),
        (5.187139, -5.600822, 0),
        (7.687139, -4.350822, 0),
        (7.687139, -6.850822, 0),
        (10.187139, -5.600822, 0),
        (13.75, 3.611581, 0),
        (-16.75, 3.611581, 0),
        (9.275575, 7.31866, 0),
        (6.775575, 8.56866, 0),
        (6.775575, 6.06866, 0),
        (4.275575, 7.31866, 0),
        (-4.275575, 7.31866, 0),
        (-6.775575, 8.56866, 0),
        (-6.775575, 6.06866, 0),
        (-9.275575, 7.31866, 0),
        (0, 15.607908, 0),
        (15, 22.107908, 0),
        (0, 28.607908, 0),
        (-15, 22.107908, 0),
        (13.75, 34.111581, 0),
        (9.275575, 36.897157, 0),
        (6.775575, 35.647157, 0),
        (6.775575, 38.147157, 0),
        (4.275575, 36.897157, 0),
        (-4.275575, 36.897157, 0),
        (-6.775575, 38.147157, 0),
        (-6.775575, 35.647157, 0),
        (-9.275575, 36.897157, 0),
        (18.35, 44.15, 0),
        (-24.65, 44.15, 0),
        (-16.75, 34.111581, 0),
        (22.65, 0, 2),
        (-22.65, 0, 2),
    ]]
    chamfer(f2_edges, length=F2_SIZE)

    # F3
    f3_edges = [f1.edges().sort_by_distance(p)[0] for p in [
        (22.65, 0, 0),
        (-22.65, 0, 0),
    ]]
    chamfer(f3_edges, length=F3_SIZE)


solid = f1.part
